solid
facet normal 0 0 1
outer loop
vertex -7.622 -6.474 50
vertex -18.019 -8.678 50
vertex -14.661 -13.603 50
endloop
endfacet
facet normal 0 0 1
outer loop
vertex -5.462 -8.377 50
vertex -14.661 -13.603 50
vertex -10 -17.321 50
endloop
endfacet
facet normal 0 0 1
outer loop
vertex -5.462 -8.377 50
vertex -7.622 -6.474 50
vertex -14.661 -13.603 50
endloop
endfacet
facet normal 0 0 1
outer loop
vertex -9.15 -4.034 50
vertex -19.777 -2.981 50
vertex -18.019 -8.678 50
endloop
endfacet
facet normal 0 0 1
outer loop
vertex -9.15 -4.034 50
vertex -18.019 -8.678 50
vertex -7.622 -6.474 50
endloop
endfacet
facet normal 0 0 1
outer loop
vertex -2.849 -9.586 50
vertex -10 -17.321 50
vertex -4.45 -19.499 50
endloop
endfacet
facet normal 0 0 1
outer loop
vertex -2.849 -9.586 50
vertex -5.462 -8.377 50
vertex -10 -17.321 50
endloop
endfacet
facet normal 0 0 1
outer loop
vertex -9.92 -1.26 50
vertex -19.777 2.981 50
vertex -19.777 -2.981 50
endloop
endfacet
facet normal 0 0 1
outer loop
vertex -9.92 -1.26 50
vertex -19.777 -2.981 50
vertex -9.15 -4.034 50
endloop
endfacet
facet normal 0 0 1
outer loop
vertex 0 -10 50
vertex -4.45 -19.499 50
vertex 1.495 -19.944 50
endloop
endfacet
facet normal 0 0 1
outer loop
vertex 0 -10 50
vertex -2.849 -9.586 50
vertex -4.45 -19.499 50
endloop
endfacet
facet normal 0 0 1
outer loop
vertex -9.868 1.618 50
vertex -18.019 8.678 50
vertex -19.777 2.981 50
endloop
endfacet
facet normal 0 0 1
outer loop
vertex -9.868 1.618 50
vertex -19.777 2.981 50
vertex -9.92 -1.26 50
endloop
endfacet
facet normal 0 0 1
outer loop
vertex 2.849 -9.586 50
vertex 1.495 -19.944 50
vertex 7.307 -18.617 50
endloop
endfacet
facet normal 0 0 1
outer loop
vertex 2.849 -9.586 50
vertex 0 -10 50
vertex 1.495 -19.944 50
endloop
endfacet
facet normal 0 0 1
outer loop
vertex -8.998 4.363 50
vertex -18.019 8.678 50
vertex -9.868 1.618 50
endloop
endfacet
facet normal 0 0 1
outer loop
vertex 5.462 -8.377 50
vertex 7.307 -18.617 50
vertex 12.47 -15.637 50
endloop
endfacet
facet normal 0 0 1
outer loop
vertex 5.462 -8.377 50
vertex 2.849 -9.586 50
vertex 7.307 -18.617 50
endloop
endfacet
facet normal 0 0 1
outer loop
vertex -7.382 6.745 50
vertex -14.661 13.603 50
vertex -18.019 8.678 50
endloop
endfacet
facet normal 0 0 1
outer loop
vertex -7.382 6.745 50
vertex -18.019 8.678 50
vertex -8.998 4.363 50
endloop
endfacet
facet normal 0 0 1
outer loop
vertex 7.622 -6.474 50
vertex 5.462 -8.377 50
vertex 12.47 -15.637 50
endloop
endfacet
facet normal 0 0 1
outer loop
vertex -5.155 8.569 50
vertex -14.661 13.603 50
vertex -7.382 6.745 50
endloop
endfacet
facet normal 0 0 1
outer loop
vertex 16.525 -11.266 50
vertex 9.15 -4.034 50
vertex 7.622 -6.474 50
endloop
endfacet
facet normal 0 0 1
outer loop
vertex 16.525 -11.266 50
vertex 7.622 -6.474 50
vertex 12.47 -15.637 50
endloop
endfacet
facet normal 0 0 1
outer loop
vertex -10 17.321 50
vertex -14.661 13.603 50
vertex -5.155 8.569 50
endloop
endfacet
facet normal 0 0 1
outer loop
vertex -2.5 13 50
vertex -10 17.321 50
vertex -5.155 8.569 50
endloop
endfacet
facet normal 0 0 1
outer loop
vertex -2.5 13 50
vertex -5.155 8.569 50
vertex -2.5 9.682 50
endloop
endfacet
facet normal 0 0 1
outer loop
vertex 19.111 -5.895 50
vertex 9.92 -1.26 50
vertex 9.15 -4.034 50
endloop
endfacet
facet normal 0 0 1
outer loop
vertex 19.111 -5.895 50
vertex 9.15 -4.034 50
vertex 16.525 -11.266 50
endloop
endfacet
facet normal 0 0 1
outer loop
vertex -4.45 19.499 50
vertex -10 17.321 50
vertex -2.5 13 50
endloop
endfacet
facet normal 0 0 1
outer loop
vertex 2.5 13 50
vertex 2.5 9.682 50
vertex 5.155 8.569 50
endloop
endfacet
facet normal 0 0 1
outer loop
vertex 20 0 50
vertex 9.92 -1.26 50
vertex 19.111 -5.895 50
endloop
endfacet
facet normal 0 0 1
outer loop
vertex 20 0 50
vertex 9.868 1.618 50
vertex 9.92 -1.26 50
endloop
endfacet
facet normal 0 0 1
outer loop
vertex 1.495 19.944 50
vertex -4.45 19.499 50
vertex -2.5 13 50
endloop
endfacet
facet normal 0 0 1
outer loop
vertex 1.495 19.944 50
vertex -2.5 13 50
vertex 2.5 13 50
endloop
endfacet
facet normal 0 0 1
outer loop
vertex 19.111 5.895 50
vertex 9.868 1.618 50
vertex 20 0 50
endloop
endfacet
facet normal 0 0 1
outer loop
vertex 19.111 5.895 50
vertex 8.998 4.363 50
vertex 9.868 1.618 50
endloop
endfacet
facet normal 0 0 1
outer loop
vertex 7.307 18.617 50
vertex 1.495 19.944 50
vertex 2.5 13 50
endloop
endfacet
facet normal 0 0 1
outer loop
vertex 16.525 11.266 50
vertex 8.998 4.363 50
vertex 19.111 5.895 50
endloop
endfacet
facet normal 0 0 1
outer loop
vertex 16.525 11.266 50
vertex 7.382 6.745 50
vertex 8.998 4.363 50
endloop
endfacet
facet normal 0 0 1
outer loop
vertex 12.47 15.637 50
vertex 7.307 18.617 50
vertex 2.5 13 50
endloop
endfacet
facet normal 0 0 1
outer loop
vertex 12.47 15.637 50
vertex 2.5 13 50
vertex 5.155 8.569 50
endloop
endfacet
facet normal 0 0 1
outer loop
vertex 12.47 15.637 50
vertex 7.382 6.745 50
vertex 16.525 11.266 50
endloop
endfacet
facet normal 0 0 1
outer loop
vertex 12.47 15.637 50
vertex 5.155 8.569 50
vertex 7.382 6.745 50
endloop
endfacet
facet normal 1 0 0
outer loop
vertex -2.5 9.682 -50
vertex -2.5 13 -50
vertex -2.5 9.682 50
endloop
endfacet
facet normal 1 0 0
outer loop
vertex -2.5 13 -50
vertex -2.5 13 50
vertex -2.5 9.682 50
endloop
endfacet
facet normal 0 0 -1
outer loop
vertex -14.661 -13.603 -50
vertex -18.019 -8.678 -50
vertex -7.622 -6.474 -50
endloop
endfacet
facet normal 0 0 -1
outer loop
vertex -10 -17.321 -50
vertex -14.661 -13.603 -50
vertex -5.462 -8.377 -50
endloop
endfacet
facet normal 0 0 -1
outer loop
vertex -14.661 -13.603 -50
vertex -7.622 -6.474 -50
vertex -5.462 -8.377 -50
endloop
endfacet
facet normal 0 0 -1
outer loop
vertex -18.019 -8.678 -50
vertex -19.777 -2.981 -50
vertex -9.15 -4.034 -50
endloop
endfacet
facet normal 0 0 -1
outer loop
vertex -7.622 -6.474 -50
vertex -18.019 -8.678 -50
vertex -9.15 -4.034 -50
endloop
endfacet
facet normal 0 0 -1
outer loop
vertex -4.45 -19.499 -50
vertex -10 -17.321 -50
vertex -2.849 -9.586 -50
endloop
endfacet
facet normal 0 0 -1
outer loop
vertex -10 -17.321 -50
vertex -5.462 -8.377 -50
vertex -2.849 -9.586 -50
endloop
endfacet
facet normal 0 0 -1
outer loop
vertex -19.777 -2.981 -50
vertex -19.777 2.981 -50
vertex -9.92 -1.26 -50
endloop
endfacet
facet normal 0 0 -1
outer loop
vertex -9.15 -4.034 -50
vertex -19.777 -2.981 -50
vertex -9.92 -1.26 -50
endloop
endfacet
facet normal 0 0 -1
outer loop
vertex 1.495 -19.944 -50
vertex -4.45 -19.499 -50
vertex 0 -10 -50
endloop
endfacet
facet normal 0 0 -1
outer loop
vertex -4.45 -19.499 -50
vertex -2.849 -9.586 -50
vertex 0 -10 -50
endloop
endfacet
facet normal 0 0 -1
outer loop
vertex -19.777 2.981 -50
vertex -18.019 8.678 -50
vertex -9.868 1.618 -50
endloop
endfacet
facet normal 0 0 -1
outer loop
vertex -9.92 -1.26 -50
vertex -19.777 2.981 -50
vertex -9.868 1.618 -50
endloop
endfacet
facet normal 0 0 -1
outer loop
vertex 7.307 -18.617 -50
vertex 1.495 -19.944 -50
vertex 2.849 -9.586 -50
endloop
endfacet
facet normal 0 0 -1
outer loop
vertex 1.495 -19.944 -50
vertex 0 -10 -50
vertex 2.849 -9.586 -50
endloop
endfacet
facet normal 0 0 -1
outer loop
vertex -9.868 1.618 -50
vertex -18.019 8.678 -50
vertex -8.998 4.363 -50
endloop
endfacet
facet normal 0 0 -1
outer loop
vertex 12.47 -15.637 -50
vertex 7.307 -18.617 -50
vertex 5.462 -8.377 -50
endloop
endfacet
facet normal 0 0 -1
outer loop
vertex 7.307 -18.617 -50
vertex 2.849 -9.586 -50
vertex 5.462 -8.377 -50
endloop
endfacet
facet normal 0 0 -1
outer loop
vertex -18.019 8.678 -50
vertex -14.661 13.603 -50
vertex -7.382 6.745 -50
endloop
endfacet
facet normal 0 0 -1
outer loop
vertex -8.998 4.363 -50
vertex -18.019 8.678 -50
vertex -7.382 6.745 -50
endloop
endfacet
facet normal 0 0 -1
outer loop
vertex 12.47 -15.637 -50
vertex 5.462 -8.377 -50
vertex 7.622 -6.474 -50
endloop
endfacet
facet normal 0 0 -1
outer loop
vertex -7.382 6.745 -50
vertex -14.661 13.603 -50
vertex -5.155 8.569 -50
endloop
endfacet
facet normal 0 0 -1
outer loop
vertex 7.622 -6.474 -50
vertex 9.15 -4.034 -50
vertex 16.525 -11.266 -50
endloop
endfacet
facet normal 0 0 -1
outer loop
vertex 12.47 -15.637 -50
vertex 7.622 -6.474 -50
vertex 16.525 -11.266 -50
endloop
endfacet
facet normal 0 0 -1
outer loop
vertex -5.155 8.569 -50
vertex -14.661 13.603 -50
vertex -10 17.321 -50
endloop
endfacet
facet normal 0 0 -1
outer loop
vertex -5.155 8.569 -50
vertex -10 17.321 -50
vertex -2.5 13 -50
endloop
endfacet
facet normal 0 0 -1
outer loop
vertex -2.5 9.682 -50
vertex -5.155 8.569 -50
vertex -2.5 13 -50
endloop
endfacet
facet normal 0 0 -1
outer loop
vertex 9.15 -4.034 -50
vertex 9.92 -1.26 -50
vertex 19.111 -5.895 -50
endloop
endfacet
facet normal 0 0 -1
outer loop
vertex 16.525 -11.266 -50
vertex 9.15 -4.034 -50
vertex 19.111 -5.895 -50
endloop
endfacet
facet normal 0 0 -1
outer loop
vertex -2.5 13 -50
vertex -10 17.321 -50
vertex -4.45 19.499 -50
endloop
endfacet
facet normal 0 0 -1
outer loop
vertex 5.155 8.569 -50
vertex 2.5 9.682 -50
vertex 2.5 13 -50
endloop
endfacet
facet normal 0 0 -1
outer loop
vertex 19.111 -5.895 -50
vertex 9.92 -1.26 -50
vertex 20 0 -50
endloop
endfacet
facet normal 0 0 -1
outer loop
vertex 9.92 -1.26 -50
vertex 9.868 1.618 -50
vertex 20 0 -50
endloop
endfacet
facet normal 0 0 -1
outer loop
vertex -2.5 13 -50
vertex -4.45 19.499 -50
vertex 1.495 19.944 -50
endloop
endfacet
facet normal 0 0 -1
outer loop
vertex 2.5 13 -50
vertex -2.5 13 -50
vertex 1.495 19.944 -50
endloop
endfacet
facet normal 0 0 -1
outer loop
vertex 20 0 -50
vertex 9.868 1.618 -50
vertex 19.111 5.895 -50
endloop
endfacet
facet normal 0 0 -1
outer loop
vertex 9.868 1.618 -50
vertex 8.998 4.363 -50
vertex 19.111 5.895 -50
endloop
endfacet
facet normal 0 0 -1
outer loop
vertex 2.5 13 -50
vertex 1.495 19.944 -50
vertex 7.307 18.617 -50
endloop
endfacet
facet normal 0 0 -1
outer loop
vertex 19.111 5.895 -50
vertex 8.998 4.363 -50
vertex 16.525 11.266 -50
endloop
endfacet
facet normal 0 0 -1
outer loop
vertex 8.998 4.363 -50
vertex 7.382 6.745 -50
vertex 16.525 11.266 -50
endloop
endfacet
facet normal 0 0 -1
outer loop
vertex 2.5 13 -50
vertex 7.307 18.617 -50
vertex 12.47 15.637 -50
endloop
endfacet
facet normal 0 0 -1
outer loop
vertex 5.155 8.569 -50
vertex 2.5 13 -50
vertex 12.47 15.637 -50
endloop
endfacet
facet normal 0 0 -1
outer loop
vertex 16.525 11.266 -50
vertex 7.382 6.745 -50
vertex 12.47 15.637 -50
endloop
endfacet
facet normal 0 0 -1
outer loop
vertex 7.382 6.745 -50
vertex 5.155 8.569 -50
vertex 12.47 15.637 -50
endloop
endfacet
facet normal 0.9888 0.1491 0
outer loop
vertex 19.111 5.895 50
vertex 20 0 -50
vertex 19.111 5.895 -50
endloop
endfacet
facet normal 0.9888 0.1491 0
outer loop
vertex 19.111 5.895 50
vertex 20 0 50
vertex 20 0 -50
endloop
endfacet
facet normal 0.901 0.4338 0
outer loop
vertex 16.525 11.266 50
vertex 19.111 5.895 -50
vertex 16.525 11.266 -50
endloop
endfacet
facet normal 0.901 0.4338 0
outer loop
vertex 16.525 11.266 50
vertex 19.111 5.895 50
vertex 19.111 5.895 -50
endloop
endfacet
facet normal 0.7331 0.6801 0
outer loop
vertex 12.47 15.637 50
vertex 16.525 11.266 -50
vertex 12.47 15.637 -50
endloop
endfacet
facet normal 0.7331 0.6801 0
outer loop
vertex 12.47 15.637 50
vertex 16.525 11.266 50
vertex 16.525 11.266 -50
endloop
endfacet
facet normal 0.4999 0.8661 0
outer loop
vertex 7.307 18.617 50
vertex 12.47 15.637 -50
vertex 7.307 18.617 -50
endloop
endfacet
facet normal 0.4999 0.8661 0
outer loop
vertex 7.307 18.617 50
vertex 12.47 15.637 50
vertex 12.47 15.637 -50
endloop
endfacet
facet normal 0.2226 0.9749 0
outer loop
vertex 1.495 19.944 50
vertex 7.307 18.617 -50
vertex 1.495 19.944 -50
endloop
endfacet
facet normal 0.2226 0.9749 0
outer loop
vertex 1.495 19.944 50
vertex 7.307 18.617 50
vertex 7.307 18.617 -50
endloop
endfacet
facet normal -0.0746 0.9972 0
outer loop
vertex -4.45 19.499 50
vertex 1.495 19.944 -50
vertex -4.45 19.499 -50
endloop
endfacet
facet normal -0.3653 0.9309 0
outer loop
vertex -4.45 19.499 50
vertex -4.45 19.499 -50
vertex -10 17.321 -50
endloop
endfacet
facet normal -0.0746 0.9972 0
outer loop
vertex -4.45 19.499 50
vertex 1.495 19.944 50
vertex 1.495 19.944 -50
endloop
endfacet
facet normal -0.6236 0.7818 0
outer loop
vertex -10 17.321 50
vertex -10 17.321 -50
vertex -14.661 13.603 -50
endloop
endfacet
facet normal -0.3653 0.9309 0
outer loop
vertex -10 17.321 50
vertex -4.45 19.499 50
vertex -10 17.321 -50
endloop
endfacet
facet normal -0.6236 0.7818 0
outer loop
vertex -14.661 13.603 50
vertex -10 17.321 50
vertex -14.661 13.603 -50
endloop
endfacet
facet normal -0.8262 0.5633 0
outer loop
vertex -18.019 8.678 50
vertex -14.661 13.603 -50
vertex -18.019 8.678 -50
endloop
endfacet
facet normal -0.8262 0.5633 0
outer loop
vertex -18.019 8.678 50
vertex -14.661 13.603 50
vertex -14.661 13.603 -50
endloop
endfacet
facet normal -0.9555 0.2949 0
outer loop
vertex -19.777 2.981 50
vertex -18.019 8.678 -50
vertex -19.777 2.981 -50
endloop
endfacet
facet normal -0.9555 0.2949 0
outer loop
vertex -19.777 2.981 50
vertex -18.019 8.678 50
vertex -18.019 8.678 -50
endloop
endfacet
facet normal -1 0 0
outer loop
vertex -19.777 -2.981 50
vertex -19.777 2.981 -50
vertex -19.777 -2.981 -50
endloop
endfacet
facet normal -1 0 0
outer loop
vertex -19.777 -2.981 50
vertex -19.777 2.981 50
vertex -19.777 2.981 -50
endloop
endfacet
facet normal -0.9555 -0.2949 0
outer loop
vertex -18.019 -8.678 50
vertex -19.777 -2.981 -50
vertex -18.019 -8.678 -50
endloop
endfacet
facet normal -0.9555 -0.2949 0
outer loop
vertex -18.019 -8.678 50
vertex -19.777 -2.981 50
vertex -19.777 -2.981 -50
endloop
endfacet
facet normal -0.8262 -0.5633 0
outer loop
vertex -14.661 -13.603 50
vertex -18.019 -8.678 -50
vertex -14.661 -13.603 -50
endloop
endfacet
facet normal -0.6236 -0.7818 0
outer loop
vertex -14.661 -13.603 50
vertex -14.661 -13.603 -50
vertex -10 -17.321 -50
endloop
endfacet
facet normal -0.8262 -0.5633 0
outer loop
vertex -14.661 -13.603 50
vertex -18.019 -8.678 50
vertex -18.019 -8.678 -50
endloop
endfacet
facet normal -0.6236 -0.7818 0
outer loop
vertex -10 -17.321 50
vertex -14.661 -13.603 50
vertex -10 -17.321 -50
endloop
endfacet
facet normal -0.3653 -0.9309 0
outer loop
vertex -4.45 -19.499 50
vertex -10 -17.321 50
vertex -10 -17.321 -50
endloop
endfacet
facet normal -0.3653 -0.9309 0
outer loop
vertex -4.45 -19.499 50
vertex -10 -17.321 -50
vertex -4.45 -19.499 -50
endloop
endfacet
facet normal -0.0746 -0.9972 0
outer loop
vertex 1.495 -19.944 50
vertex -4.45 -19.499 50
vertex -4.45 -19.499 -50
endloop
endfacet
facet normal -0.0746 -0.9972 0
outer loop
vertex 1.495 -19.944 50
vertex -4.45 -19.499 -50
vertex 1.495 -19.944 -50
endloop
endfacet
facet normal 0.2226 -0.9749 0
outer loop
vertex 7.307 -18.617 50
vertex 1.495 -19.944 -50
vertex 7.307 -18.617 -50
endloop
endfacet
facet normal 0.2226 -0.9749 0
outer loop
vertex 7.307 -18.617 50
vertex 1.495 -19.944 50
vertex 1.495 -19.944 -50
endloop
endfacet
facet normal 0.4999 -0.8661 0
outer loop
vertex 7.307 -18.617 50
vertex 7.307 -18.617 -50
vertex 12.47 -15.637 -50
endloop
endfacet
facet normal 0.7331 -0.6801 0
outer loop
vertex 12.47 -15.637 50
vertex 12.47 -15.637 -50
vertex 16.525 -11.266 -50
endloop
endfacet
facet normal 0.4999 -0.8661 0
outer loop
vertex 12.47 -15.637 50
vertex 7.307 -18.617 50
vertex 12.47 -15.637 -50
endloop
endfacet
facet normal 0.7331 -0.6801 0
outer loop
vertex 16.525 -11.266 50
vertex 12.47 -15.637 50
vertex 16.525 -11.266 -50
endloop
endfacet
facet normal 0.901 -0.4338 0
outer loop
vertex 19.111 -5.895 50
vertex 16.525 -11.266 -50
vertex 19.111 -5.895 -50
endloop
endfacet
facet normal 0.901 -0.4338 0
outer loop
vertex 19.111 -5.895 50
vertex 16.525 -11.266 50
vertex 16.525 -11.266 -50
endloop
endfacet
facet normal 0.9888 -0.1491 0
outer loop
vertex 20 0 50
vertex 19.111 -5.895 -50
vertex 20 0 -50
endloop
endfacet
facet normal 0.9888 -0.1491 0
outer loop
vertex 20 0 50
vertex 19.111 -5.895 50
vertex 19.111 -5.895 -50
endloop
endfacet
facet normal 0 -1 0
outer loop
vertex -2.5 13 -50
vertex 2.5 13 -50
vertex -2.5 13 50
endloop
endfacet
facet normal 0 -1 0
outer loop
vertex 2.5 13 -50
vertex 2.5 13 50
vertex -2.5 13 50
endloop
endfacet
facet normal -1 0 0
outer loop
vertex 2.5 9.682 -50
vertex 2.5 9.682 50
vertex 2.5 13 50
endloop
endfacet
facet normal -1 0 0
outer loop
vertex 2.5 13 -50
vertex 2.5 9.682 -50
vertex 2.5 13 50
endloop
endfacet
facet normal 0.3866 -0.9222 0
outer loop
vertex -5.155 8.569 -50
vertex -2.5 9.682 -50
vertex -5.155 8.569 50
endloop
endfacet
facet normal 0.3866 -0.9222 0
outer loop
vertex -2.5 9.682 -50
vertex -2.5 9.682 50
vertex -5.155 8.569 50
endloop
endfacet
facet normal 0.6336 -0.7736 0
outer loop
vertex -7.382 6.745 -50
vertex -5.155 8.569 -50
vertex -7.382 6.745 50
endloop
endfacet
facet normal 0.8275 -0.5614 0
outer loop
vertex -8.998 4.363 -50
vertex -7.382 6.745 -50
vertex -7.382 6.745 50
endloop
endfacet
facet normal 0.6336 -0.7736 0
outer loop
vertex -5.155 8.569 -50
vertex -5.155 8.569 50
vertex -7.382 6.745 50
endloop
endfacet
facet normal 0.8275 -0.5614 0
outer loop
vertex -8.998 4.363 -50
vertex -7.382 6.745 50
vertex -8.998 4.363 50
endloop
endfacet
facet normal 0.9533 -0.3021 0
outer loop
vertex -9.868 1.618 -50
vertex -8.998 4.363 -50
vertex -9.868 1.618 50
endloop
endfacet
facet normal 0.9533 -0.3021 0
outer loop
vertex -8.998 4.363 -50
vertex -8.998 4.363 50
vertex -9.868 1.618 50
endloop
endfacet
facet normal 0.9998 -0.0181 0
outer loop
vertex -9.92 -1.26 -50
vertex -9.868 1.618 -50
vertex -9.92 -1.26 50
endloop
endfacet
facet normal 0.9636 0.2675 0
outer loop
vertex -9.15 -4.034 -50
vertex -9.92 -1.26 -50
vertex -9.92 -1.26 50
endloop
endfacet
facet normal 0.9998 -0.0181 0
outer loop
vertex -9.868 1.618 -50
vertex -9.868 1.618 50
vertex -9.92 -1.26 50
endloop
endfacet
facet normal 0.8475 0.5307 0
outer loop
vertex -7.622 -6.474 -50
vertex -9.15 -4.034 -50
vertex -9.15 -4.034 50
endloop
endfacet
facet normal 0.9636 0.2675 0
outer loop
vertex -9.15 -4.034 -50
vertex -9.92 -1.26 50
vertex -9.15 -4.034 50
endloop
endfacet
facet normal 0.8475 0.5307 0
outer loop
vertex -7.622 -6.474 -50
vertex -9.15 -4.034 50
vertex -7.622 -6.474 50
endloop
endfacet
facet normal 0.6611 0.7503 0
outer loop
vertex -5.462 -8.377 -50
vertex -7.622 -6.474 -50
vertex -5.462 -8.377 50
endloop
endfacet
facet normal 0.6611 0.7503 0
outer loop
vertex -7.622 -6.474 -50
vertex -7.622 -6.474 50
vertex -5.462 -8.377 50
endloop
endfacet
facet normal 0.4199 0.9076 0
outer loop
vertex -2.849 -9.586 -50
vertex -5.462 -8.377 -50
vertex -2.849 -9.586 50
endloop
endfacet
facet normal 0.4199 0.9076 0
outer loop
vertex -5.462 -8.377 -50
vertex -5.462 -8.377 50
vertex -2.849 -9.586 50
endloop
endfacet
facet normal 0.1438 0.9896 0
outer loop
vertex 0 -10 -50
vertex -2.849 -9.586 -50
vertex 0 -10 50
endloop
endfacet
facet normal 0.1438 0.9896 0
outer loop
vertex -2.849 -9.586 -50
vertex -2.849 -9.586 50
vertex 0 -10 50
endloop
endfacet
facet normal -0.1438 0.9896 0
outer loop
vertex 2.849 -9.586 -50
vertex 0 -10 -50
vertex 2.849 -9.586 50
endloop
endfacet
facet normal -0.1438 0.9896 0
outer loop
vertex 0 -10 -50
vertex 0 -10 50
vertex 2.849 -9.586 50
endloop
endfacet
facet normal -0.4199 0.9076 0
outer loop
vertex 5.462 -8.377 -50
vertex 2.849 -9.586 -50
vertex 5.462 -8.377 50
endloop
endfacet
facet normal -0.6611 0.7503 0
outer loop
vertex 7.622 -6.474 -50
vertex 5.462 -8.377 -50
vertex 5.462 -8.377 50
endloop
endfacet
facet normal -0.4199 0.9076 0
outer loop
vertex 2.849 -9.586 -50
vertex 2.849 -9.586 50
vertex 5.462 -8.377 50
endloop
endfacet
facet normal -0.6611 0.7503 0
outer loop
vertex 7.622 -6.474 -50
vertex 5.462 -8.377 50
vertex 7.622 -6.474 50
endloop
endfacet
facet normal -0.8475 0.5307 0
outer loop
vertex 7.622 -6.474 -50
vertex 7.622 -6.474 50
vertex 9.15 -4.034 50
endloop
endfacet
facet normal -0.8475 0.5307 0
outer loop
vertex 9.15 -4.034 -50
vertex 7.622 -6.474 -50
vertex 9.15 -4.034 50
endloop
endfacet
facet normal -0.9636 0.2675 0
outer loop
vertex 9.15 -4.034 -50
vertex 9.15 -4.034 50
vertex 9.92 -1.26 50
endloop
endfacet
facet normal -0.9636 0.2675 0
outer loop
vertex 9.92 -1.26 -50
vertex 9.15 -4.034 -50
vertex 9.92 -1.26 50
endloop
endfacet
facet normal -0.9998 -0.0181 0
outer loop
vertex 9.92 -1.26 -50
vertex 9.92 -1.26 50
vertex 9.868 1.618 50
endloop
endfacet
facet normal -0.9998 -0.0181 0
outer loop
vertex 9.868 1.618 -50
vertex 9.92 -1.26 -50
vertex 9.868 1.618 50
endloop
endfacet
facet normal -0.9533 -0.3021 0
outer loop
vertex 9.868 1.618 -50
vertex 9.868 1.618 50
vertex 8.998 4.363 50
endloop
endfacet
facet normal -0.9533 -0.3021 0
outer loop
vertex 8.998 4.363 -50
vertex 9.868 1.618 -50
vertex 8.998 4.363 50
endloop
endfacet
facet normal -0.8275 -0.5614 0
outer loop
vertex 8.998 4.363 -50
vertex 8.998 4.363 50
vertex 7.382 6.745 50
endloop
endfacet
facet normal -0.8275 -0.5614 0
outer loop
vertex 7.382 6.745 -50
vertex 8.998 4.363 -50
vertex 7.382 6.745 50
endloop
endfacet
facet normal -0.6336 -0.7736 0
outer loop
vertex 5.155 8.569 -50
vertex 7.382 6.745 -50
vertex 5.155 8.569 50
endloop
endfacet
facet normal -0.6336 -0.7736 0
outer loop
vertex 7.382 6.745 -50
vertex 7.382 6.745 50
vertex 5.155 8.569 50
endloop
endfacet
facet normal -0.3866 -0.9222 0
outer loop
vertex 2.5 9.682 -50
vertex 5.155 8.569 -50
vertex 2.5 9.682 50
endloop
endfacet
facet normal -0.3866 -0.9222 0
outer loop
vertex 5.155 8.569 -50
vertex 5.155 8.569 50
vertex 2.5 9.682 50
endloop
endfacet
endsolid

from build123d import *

# Parameters (mm, degrees)
SKETCH1_R           = 20
BOSS_EXTRUDE1_DEPTH = 50


with BuildPart() as part:
    # Sketch1 → Boss-Extrude1 (new body, symmetric)
    with BuildSketch(Plane.XY):
        Circle(SKETCH1_R)
        with BuildLine():
            Line((2.5, 9.682458366), (2.5, 13))
            Line((2.5, 13), (-2.5, 13))
            Line((-2.5, 13), (-2.5, 9.682458366))
            ThreePointArc((-2.5, 9.682458366), (0, -10), (2.5, 9.682458366))
        make_face(mode=Mode.SUBTRACT)
    extrude(amount=BOSS_EXTRUDE1_DEPTH, both=True)


solid = part.part
